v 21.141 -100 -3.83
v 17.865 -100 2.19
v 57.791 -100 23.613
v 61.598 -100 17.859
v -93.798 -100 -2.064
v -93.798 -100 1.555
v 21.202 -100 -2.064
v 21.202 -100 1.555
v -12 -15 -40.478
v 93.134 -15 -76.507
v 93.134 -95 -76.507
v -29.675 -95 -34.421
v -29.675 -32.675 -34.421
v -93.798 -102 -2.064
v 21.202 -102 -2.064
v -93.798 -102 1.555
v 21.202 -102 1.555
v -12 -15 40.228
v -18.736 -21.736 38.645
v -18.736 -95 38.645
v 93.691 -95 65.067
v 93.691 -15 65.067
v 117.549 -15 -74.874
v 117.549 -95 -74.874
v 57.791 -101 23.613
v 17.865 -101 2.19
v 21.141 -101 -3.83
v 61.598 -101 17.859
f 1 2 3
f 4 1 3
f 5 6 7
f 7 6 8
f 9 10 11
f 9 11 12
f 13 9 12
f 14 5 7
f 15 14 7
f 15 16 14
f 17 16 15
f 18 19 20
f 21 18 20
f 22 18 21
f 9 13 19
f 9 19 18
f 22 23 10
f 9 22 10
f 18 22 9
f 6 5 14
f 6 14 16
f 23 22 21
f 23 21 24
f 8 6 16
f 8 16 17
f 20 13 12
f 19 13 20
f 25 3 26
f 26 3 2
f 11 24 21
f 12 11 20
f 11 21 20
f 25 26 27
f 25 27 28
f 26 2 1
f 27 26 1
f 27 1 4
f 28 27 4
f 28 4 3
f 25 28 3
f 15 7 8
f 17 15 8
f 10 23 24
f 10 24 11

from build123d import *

# Parameters (mm, degrees)
SKETCH001_W  = 115
SKETCH001_H  = 3.61845
PAD001_DEPTH = 2
PAD003_DEPTH = 1
SKETCH002_W  = 485.407379
SKETCH002_H  = 295.218536
PAD002_DEPTH = 18
PAD_DEPTH    = 80


with BuildPart() as mins:
    # Sketch001 → Pad001 (new body)
    with BuildSketch(Plane.XZ.offset(100)):
        with Locations((-36.29836, -0.254388)):
            Rectangle(SKETCH001_W, SKETCH001_H)
    extrude(amount=PAD001_DEPTH)


with BuildPart() as hours:
    # Sketch003 → Pad003 (new body)
    with BuildSketch(Plane.XZ.offset(100)):
        Polygon((17.86513, 2.189523), (21.14066, -3.830374), (61.5979, 17.858953), (57.791188, 23.613267), align=None)
    extrude(amount=PAD003_DEPTH)


with BuildPart() as wall:
    # Sketch002 → Pad002 (new body)
    with BuildSketch(Plane(origin=(0, 0, 0), x_dir=(0.707107, 0.707107, 0), z_dir=(0.707107, -0.707107, 0))):
        with Locations((9.658203, 3.703232)):
            Rectangle(SKETCH002_W, SKETCH002_H)
    extrude(amount=-PAD002_DEPTH)


with BuildPart() as wall_1:
    # Body placement: moved
    add(wall.part.moved(Location((0, -3, 0))))


with BuildPart() as cut:
    # Sketch → Pad (new body)
    with BuildSketch(Plane.XZ):
        Polygon((-18.735967, 38.644798), (93.691037, 65.066546), (117.549288, -74.874246), (93.133817, -76.506926), (-29.674964, -34.420876), align=None)
    extrude(amount=PAD_DEPTH)


with BuildPart() as cut_1:
    # Body001 placement: moved
    add(cut.part.moved(Location((0, -15, 0))))

    # Cut: cut wall
    add(wall_1.part, mode=Mode.SUBTRACT)


solid = Compound([mins.part, hours.part, cut_1.part])
